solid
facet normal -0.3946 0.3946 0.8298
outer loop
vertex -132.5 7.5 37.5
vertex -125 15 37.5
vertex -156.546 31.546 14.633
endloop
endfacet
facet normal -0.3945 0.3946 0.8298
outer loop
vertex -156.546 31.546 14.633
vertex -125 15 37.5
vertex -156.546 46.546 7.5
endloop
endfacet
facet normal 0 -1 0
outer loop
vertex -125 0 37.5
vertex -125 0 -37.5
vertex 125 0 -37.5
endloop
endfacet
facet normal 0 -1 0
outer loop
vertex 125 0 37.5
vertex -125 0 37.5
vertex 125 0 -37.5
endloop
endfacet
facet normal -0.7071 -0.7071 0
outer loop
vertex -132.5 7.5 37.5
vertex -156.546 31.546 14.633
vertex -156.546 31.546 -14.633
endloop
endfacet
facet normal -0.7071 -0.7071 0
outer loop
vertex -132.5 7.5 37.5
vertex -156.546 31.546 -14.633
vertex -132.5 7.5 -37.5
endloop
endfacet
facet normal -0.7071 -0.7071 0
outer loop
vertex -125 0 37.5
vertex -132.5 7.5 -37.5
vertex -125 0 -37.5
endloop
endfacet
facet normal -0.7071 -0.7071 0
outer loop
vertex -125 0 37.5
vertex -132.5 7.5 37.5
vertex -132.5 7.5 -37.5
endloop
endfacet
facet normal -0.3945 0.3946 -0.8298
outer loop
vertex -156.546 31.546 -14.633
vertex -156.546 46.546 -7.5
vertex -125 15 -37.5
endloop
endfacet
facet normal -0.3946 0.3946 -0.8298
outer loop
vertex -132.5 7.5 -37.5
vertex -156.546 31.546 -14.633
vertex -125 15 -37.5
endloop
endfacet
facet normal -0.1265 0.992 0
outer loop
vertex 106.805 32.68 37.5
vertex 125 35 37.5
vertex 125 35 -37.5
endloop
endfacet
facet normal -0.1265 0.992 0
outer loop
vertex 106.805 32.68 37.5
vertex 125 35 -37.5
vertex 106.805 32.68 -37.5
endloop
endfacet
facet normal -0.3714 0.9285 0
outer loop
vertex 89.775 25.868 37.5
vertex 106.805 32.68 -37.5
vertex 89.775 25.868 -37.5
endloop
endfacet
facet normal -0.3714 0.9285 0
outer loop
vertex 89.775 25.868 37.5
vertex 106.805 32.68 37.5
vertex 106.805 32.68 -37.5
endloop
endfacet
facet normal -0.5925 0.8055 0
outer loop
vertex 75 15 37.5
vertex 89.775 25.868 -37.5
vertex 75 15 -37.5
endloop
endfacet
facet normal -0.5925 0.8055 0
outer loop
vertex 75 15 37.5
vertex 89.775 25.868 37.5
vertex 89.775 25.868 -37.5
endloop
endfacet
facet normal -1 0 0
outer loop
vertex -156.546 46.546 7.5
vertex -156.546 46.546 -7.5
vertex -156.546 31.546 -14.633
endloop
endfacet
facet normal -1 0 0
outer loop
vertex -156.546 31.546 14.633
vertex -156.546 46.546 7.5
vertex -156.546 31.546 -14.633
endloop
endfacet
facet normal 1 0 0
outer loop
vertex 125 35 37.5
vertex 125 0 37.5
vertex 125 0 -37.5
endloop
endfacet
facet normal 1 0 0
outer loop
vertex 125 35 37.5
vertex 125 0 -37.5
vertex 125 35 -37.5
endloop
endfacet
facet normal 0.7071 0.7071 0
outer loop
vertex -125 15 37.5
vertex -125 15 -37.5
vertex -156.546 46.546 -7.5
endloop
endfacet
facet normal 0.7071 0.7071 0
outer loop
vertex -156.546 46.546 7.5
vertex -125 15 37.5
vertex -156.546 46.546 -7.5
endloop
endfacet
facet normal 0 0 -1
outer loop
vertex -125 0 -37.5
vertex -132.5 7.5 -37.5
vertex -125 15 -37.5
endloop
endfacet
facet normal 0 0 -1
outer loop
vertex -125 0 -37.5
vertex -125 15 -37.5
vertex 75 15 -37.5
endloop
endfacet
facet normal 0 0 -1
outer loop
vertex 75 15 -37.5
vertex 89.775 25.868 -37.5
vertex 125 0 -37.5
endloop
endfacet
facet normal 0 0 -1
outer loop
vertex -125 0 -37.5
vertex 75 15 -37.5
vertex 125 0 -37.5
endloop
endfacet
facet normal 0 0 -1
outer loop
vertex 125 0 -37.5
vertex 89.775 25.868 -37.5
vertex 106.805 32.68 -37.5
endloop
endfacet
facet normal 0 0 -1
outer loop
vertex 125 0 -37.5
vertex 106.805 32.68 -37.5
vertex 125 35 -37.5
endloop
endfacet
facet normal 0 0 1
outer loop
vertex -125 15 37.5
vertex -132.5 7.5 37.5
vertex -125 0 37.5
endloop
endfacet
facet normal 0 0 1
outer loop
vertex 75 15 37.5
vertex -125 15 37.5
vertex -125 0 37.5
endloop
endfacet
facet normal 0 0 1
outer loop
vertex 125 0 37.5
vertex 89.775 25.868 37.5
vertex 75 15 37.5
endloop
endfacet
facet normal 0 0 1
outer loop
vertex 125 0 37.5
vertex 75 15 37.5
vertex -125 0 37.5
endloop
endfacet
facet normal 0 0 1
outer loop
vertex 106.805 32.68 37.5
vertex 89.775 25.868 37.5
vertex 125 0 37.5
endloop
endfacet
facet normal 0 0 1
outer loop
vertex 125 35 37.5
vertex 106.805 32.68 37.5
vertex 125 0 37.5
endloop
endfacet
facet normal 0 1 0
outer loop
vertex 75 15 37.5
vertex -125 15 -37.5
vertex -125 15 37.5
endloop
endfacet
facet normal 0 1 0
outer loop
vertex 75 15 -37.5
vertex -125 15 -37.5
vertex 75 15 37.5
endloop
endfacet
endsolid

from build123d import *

# Parameters (mm, degrees)
SKETCH1_W           = 250
SKETCH1_H           = 75
BOSS_EXTRUDE1_DEPTH = 15
BOSS_EXTRUDE2_DEPTH = 37.5
BOSS_EXTRUDE3_DEPTH = 75
CUT_EXTRUDE1_DEPTH  = 75


with BuildPart() as part:
    # Sketch1 → Boss-Extrude1 (new body)
    with BuildSketch(Plane(origin=(0, 0, 0), x_dir=(1, 0, 0), z_dir=(0, 1, 0))):
        Rectangle(SKETCH1_W, SKETCH1_H)
    extrude(amount=BOSS_EXTRUDE1_DEPTH)

    # Sketch3 → Boss-Extrude2 (add)
    with BuildSketch(Plane.XY):
        with BuildLine():
            Line((125, 15), (125, 35))
            ThreePointArc((125, 35), (98.074175964, 29.814560089), (75, 15))
            Line((75, 15), (125, 15))
        make_face()
    boss_extrude2 = extrude(amount=BOSS_EXTRUDE2_DEPTH)

    # Mirror1: Boss-Extrude2 across plane
    add(boss_extrude2.mirror(Plane(origin=(125, -37.5, 0), x_dir=(1, 0, 0), z_dir=(0, 0, 1))))

    # Sketch6 → Boss-Extrude3 (add)
    with BuildSketch(Plane.XY.offset(37.5)):
        Polygon((-125, 0), (-125, 15), (-156.545603012, 46.545603012), (-156.545603012, 31.545603012), align=None)
    extrude(amount=-BOSS_EXTRUDE3_DEPTH)

    # Sketch7 → Cut-Extrude1 (cut)
    with BuildSketch(Plane(origin=(-55, -55, 0), x_dir=(0, 0, -1), z_dir=(0.7071067811865438, 0.7071067811865513, 0))):
        Polygon((-37.5, 98.994949366), (-7.5, 143.607168979), (-37.5, 143.607168979), align=None)
        Polygon((7.5, 143.607168979), (37.5, 98.994949366), (37.5, 143.607168979), align=None)
    extrude(amount=-CUT_EXTRUDE1_DEPTH, mode=Mode.SUBTRACT)


solid = part.part
